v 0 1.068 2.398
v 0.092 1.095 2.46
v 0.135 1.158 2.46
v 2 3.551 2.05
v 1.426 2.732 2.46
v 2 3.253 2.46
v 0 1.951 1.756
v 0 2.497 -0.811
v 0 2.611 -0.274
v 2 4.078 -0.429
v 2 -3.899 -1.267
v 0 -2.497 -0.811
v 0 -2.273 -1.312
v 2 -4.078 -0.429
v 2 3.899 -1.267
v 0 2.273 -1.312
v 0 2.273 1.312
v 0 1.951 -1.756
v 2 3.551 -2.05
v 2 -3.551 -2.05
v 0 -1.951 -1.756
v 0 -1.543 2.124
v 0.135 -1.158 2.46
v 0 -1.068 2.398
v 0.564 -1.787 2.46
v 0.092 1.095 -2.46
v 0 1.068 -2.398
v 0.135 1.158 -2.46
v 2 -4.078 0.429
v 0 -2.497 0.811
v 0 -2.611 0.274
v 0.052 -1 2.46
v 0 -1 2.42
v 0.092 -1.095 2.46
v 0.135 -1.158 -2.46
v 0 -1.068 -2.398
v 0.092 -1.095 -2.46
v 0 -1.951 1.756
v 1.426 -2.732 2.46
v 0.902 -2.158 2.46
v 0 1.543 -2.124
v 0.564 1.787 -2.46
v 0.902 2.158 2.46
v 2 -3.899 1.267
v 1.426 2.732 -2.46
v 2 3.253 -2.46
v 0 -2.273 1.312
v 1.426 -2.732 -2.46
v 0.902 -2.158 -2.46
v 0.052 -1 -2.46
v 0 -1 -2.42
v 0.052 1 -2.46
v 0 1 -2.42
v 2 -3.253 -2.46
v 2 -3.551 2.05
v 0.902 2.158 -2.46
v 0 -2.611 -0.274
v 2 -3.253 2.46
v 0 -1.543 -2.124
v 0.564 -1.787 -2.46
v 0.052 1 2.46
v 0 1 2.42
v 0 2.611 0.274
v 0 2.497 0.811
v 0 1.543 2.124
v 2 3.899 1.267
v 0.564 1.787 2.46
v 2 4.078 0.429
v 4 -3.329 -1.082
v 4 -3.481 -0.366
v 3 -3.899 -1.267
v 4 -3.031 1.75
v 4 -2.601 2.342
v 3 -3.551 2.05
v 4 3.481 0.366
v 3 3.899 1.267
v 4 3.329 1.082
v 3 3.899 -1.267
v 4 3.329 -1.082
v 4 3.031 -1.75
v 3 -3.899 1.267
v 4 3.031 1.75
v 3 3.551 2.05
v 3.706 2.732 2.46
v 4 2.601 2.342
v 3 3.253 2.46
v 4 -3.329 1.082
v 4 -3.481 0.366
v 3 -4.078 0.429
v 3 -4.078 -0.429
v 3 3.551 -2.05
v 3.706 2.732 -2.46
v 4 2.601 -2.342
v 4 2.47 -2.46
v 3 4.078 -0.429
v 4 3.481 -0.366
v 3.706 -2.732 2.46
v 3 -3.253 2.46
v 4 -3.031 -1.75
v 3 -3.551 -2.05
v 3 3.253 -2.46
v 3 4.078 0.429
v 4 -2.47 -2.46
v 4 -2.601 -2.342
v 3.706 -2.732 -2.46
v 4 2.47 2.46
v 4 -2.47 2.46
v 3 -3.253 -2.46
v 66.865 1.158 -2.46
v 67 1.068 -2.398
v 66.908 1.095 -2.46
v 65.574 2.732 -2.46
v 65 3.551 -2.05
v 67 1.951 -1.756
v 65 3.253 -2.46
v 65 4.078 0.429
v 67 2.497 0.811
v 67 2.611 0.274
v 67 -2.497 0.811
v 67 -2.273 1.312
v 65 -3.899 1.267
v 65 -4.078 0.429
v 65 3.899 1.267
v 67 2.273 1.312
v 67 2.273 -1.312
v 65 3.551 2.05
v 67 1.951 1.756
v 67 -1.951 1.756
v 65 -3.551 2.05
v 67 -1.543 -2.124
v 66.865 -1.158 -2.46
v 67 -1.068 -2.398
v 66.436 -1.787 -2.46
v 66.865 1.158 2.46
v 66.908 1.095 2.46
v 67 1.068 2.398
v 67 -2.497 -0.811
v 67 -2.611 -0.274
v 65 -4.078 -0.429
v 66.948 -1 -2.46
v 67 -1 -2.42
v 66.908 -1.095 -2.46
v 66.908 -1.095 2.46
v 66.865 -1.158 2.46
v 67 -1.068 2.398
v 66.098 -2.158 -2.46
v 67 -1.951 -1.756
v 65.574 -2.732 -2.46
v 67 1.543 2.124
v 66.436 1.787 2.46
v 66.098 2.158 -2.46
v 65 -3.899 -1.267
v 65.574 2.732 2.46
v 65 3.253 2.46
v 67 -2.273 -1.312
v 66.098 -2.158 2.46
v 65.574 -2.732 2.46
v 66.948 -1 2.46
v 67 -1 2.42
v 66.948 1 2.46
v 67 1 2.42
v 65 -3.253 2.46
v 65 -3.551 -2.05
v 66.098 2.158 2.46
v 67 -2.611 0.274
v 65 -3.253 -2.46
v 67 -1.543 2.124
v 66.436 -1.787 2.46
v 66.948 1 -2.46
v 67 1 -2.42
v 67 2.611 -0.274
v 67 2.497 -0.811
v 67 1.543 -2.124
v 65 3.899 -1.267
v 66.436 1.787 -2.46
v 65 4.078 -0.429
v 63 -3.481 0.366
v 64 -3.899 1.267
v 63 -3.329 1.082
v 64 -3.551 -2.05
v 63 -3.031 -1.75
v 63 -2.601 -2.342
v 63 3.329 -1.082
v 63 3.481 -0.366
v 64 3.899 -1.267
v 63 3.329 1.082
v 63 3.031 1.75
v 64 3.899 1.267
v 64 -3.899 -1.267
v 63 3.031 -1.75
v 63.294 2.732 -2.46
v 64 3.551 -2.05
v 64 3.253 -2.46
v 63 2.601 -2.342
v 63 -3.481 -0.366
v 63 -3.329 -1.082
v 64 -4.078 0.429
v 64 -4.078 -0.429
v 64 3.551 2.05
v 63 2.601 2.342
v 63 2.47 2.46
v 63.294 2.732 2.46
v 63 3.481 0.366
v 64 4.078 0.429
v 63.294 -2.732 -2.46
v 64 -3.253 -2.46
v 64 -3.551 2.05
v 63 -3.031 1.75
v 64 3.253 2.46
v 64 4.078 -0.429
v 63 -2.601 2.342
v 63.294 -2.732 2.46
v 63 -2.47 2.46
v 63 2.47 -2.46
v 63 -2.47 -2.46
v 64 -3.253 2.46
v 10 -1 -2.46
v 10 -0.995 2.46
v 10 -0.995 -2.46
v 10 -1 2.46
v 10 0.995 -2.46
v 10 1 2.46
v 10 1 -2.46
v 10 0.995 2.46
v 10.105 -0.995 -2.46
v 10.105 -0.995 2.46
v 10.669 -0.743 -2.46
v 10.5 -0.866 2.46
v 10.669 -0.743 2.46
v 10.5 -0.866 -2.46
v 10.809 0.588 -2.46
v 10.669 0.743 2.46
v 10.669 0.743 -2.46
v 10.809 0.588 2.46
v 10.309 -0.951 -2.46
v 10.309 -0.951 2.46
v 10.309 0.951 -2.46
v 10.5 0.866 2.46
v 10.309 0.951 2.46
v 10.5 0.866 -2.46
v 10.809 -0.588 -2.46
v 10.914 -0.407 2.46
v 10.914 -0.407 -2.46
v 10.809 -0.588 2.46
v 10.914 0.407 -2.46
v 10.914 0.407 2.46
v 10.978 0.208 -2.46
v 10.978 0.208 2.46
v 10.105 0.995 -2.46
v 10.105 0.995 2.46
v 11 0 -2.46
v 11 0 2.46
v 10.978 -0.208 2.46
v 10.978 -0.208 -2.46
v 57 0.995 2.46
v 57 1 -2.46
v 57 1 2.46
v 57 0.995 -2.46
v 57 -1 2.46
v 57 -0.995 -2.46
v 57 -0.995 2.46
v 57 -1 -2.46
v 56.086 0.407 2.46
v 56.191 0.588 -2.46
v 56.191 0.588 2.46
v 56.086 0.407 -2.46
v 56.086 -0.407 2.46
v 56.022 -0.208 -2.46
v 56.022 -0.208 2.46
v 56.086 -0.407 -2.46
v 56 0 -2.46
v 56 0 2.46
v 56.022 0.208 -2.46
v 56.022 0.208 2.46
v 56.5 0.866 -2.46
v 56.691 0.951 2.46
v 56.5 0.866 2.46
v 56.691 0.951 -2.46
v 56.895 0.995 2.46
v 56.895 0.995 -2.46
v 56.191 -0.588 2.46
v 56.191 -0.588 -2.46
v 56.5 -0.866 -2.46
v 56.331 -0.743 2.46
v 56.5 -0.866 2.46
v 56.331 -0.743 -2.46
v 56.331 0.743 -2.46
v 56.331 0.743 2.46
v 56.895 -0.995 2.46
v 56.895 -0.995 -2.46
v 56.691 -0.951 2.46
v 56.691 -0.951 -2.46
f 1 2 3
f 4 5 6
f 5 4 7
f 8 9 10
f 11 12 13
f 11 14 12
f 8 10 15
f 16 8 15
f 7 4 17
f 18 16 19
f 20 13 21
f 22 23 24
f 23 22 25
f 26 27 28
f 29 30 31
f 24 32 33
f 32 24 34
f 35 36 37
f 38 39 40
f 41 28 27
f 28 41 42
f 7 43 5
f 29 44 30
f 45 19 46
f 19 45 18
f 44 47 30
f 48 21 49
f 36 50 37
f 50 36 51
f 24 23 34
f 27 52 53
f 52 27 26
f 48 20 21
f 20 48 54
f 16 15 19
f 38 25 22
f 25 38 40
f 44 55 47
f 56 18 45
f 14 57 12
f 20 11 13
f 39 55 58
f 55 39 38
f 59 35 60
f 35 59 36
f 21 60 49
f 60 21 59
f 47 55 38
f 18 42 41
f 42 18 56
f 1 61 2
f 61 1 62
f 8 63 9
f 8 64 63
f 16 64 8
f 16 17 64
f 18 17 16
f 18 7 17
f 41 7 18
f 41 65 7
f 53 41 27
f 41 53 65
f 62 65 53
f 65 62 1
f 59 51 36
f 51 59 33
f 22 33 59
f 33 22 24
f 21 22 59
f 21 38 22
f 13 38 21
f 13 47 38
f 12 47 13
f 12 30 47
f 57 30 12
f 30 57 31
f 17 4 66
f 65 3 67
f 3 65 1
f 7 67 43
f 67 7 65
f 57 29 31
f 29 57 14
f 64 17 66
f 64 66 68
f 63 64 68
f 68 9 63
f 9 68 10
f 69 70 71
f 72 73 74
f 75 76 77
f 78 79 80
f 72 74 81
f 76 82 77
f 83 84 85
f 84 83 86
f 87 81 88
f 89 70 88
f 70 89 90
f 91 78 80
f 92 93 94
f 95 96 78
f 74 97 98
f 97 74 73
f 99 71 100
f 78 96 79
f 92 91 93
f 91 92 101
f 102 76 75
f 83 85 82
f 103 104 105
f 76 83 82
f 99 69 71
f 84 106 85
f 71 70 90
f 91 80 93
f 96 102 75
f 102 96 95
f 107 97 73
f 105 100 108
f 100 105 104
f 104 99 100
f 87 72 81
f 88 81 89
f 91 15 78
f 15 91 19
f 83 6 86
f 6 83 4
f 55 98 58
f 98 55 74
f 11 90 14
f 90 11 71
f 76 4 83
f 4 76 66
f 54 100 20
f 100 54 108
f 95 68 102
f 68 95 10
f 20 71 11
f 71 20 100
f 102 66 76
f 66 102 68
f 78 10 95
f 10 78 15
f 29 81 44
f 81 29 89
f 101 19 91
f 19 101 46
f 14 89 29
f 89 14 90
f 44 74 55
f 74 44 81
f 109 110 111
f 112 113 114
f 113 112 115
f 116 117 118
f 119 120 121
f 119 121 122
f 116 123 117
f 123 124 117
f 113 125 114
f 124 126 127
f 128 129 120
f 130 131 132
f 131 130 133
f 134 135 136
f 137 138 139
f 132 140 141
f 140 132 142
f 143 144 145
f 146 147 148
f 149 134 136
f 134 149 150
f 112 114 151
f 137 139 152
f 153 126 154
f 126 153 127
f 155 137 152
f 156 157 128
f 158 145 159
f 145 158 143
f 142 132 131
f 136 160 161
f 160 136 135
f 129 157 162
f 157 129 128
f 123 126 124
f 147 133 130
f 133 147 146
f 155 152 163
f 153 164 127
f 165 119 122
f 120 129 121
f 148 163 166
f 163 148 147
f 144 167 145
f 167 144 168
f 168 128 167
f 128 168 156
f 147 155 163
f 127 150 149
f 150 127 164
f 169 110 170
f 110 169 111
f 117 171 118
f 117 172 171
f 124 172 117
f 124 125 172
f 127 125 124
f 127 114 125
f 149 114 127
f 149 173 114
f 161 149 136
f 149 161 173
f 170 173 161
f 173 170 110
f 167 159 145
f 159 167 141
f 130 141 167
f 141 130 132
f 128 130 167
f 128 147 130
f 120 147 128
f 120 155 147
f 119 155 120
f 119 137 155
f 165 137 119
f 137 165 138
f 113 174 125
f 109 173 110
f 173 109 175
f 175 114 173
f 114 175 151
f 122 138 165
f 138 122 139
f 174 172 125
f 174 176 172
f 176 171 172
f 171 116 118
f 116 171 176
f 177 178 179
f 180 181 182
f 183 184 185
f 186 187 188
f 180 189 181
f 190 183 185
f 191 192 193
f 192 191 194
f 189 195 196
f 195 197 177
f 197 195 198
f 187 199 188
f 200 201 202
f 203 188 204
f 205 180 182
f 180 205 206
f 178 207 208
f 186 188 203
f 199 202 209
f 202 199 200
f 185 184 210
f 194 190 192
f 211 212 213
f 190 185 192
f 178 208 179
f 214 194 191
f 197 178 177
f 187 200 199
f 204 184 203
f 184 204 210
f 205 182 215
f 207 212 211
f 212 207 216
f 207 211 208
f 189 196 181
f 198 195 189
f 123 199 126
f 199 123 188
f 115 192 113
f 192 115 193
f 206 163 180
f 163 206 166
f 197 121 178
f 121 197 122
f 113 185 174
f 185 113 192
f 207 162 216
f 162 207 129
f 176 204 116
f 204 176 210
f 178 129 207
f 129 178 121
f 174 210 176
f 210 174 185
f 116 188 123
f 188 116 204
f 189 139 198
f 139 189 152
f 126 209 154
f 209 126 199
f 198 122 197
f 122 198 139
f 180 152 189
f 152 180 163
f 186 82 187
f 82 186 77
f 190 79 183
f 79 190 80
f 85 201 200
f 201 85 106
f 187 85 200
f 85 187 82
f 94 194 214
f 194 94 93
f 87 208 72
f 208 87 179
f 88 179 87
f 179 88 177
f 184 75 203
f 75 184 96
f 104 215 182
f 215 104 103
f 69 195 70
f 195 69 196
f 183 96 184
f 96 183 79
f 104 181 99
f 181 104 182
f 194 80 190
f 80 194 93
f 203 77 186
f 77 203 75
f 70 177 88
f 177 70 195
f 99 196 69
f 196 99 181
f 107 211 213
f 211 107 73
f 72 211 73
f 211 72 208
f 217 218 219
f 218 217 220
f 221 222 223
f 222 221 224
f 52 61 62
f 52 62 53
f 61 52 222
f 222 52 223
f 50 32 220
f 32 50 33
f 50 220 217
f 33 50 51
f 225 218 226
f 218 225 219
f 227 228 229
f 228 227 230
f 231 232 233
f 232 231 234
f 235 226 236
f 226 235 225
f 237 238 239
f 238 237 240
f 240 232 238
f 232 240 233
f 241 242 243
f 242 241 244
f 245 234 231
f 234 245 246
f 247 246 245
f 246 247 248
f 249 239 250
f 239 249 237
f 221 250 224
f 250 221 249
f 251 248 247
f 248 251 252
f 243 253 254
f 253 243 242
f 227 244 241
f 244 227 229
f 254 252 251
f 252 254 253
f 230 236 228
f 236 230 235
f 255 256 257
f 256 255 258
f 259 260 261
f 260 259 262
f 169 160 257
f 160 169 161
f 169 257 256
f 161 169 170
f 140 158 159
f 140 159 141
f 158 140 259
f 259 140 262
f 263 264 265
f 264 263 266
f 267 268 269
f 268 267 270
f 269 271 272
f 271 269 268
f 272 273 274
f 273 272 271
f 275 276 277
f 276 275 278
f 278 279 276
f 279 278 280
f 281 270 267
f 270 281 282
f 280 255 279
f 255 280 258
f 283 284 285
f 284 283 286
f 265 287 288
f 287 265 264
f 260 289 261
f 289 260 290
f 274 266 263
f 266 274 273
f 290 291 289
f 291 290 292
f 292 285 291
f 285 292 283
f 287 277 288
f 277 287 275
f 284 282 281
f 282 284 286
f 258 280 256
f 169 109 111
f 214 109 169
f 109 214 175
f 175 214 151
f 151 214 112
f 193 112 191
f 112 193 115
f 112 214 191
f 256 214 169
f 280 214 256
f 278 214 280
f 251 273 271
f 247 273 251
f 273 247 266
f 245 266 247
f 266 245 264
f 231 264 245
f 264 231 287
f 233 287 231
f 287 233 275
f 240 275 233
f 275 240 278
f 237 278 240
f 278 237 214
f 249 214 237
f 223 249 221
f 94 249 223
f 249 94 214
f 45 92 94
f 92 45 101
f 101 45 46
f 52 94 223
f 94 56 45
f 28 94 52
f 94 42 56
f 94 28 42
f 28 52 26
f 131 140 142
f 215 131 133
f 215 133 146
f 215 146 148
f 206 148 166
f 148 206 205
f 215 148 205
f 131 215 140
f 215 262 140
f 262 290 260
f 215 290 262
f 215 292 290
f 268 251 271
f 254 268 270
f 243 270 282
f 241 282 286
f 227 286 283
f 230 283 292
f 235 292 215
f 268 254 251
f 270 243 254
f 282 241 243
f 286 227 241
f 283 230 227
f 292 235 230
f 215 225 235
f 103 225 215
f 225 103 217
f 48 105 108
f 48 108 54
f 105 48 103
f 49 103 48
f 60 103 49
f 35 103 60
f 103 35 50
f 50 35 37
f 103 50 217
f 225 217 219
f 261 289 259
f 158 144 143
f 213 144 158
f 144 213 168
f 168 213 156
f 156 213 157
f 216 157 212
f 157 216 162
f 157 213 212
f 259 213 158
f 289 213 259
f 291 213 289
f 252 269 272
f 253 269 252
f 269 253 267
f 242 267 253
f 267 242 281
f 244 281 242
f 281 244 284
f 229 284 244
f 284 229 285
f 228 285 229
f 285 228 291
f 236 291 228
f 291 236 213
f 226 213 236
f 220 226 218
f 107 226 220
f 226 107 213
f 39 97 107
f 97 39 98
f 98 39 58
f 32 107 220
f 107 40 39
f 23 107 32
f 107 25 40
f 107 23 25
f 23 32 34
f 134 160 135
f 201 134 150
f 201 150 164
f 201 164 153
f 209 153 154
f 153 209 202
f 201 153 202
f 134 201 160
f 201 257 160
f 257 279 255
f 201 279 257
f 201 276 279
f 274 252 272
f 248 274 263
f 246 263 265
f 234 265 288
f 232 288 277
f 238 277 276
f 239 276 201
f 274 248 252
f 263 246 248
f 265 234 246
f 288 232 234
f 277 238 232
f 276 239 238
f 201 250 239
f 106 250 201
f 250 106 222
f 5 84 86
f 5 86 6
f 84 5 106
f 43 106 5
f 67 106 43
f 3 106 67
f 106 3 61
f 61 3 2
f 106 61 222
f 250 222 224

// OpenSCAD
// [FL_INDEX: keywords="openscad, 3d_parametric, Customizable_simple_pin_connector, csg_solid" | COT="Parametric OpenSCAD design from 3DCodeverse"]
// Title: Customizable simple pin connector

// The total length of the pin.
pin_length = 67;
// The radius of the pin shaft.
pin_radius = 3.5;
// The length of the head of the pin.
pin_head_length = 4;
// The lip around the pin head. This is the bit that grips the sides of the pin hole.
pin_head_lip = 0.6;
// The length of the slot on the pin.
slot_length = 10;
// The width of the slot in the pin.
slot_width = 2;
// The number of sides of the pin shaft and pin head.
sides = 30;
// The fractional falttening of the shaft. For example with a pin shaft radius of 5mm, then 0.1 puts 0.5mm deep flats on the pin.
flat = 0.2;

total_pin_radius = pin_radius + pin_head_lip;

module pin_head()
{
	union()
	{
		cylinder( r1 = pin_radius*0.75, r2 = pin_radius+pin_head_lip, h = pin_head_length*2/4, $fn = sides);
		translate([0,0, pin_head_length*3/4])cylinder( r1 = pin_radius+pin_head_lip, r2 = pin_radius, h = pin_head_length*1/4, $fn = sides);
		translate([0,0, pin_head_length*2/4])cylinder( r1 = pin_radius+pin_head_lip, r2 = pin_radius+pin_head_lip, h = pin_head_length*1/4, $fn = sides);
	}
}

module slot()
{
	slot_depth = 2*total_pin_radius + 0.1;
	union()
	{
		translate([ -slot_depth/2, -slot_width/2, 0])cube([slot_depth, slot_width, slot_length]);
		rotate([0, 90, 0])cylinder( r1 = slot_width/2, r2 = slot_width/2, h = slot_depth, center = true, $fn = sides);
		translate([0, 0, slot_length])rotate([0, 90, 0])cylinder( r1 = slot_width/2, r2 = slot_width/2, h = slot_depth, center = true, $fn = sides);
	}
}

module shaft()
{
	union()
	{
		pin_head();
		translate([0,0, pin_head_length])cylinder( r1 = pin_radius, r2 = pin_radius, h = pin_length - 2*pin_head_length + 0.1, $fn = sides);
		translate([0, 0, pin_length ])rotate([0,180,0])pin_head();
	}
}


module flat()
{
	flat_depth = flat*total_pin_radius;
	flat_width = 2*total_pin_radius;
	union()
	{
		translate([total_pin_radius - flat_depth, 0, pin_length/2])cube([flat_depth*2, 2*total_pin_radius, pin_length + 0.1], center = true);
		translate([-(total_pin_radius - flat_depth), 0, pin_length/2])cube([flat_depth*2, 2*total_pin_radius, pin_length + 0.1], center = true);
	}
}

module pin()
{
	rotate([0, 90, 0])
	difference()
	{
		shaft();
		slot();
		translate([0,0,pin_length - slot_length])slot();
		flat();
	}
}

pin();
